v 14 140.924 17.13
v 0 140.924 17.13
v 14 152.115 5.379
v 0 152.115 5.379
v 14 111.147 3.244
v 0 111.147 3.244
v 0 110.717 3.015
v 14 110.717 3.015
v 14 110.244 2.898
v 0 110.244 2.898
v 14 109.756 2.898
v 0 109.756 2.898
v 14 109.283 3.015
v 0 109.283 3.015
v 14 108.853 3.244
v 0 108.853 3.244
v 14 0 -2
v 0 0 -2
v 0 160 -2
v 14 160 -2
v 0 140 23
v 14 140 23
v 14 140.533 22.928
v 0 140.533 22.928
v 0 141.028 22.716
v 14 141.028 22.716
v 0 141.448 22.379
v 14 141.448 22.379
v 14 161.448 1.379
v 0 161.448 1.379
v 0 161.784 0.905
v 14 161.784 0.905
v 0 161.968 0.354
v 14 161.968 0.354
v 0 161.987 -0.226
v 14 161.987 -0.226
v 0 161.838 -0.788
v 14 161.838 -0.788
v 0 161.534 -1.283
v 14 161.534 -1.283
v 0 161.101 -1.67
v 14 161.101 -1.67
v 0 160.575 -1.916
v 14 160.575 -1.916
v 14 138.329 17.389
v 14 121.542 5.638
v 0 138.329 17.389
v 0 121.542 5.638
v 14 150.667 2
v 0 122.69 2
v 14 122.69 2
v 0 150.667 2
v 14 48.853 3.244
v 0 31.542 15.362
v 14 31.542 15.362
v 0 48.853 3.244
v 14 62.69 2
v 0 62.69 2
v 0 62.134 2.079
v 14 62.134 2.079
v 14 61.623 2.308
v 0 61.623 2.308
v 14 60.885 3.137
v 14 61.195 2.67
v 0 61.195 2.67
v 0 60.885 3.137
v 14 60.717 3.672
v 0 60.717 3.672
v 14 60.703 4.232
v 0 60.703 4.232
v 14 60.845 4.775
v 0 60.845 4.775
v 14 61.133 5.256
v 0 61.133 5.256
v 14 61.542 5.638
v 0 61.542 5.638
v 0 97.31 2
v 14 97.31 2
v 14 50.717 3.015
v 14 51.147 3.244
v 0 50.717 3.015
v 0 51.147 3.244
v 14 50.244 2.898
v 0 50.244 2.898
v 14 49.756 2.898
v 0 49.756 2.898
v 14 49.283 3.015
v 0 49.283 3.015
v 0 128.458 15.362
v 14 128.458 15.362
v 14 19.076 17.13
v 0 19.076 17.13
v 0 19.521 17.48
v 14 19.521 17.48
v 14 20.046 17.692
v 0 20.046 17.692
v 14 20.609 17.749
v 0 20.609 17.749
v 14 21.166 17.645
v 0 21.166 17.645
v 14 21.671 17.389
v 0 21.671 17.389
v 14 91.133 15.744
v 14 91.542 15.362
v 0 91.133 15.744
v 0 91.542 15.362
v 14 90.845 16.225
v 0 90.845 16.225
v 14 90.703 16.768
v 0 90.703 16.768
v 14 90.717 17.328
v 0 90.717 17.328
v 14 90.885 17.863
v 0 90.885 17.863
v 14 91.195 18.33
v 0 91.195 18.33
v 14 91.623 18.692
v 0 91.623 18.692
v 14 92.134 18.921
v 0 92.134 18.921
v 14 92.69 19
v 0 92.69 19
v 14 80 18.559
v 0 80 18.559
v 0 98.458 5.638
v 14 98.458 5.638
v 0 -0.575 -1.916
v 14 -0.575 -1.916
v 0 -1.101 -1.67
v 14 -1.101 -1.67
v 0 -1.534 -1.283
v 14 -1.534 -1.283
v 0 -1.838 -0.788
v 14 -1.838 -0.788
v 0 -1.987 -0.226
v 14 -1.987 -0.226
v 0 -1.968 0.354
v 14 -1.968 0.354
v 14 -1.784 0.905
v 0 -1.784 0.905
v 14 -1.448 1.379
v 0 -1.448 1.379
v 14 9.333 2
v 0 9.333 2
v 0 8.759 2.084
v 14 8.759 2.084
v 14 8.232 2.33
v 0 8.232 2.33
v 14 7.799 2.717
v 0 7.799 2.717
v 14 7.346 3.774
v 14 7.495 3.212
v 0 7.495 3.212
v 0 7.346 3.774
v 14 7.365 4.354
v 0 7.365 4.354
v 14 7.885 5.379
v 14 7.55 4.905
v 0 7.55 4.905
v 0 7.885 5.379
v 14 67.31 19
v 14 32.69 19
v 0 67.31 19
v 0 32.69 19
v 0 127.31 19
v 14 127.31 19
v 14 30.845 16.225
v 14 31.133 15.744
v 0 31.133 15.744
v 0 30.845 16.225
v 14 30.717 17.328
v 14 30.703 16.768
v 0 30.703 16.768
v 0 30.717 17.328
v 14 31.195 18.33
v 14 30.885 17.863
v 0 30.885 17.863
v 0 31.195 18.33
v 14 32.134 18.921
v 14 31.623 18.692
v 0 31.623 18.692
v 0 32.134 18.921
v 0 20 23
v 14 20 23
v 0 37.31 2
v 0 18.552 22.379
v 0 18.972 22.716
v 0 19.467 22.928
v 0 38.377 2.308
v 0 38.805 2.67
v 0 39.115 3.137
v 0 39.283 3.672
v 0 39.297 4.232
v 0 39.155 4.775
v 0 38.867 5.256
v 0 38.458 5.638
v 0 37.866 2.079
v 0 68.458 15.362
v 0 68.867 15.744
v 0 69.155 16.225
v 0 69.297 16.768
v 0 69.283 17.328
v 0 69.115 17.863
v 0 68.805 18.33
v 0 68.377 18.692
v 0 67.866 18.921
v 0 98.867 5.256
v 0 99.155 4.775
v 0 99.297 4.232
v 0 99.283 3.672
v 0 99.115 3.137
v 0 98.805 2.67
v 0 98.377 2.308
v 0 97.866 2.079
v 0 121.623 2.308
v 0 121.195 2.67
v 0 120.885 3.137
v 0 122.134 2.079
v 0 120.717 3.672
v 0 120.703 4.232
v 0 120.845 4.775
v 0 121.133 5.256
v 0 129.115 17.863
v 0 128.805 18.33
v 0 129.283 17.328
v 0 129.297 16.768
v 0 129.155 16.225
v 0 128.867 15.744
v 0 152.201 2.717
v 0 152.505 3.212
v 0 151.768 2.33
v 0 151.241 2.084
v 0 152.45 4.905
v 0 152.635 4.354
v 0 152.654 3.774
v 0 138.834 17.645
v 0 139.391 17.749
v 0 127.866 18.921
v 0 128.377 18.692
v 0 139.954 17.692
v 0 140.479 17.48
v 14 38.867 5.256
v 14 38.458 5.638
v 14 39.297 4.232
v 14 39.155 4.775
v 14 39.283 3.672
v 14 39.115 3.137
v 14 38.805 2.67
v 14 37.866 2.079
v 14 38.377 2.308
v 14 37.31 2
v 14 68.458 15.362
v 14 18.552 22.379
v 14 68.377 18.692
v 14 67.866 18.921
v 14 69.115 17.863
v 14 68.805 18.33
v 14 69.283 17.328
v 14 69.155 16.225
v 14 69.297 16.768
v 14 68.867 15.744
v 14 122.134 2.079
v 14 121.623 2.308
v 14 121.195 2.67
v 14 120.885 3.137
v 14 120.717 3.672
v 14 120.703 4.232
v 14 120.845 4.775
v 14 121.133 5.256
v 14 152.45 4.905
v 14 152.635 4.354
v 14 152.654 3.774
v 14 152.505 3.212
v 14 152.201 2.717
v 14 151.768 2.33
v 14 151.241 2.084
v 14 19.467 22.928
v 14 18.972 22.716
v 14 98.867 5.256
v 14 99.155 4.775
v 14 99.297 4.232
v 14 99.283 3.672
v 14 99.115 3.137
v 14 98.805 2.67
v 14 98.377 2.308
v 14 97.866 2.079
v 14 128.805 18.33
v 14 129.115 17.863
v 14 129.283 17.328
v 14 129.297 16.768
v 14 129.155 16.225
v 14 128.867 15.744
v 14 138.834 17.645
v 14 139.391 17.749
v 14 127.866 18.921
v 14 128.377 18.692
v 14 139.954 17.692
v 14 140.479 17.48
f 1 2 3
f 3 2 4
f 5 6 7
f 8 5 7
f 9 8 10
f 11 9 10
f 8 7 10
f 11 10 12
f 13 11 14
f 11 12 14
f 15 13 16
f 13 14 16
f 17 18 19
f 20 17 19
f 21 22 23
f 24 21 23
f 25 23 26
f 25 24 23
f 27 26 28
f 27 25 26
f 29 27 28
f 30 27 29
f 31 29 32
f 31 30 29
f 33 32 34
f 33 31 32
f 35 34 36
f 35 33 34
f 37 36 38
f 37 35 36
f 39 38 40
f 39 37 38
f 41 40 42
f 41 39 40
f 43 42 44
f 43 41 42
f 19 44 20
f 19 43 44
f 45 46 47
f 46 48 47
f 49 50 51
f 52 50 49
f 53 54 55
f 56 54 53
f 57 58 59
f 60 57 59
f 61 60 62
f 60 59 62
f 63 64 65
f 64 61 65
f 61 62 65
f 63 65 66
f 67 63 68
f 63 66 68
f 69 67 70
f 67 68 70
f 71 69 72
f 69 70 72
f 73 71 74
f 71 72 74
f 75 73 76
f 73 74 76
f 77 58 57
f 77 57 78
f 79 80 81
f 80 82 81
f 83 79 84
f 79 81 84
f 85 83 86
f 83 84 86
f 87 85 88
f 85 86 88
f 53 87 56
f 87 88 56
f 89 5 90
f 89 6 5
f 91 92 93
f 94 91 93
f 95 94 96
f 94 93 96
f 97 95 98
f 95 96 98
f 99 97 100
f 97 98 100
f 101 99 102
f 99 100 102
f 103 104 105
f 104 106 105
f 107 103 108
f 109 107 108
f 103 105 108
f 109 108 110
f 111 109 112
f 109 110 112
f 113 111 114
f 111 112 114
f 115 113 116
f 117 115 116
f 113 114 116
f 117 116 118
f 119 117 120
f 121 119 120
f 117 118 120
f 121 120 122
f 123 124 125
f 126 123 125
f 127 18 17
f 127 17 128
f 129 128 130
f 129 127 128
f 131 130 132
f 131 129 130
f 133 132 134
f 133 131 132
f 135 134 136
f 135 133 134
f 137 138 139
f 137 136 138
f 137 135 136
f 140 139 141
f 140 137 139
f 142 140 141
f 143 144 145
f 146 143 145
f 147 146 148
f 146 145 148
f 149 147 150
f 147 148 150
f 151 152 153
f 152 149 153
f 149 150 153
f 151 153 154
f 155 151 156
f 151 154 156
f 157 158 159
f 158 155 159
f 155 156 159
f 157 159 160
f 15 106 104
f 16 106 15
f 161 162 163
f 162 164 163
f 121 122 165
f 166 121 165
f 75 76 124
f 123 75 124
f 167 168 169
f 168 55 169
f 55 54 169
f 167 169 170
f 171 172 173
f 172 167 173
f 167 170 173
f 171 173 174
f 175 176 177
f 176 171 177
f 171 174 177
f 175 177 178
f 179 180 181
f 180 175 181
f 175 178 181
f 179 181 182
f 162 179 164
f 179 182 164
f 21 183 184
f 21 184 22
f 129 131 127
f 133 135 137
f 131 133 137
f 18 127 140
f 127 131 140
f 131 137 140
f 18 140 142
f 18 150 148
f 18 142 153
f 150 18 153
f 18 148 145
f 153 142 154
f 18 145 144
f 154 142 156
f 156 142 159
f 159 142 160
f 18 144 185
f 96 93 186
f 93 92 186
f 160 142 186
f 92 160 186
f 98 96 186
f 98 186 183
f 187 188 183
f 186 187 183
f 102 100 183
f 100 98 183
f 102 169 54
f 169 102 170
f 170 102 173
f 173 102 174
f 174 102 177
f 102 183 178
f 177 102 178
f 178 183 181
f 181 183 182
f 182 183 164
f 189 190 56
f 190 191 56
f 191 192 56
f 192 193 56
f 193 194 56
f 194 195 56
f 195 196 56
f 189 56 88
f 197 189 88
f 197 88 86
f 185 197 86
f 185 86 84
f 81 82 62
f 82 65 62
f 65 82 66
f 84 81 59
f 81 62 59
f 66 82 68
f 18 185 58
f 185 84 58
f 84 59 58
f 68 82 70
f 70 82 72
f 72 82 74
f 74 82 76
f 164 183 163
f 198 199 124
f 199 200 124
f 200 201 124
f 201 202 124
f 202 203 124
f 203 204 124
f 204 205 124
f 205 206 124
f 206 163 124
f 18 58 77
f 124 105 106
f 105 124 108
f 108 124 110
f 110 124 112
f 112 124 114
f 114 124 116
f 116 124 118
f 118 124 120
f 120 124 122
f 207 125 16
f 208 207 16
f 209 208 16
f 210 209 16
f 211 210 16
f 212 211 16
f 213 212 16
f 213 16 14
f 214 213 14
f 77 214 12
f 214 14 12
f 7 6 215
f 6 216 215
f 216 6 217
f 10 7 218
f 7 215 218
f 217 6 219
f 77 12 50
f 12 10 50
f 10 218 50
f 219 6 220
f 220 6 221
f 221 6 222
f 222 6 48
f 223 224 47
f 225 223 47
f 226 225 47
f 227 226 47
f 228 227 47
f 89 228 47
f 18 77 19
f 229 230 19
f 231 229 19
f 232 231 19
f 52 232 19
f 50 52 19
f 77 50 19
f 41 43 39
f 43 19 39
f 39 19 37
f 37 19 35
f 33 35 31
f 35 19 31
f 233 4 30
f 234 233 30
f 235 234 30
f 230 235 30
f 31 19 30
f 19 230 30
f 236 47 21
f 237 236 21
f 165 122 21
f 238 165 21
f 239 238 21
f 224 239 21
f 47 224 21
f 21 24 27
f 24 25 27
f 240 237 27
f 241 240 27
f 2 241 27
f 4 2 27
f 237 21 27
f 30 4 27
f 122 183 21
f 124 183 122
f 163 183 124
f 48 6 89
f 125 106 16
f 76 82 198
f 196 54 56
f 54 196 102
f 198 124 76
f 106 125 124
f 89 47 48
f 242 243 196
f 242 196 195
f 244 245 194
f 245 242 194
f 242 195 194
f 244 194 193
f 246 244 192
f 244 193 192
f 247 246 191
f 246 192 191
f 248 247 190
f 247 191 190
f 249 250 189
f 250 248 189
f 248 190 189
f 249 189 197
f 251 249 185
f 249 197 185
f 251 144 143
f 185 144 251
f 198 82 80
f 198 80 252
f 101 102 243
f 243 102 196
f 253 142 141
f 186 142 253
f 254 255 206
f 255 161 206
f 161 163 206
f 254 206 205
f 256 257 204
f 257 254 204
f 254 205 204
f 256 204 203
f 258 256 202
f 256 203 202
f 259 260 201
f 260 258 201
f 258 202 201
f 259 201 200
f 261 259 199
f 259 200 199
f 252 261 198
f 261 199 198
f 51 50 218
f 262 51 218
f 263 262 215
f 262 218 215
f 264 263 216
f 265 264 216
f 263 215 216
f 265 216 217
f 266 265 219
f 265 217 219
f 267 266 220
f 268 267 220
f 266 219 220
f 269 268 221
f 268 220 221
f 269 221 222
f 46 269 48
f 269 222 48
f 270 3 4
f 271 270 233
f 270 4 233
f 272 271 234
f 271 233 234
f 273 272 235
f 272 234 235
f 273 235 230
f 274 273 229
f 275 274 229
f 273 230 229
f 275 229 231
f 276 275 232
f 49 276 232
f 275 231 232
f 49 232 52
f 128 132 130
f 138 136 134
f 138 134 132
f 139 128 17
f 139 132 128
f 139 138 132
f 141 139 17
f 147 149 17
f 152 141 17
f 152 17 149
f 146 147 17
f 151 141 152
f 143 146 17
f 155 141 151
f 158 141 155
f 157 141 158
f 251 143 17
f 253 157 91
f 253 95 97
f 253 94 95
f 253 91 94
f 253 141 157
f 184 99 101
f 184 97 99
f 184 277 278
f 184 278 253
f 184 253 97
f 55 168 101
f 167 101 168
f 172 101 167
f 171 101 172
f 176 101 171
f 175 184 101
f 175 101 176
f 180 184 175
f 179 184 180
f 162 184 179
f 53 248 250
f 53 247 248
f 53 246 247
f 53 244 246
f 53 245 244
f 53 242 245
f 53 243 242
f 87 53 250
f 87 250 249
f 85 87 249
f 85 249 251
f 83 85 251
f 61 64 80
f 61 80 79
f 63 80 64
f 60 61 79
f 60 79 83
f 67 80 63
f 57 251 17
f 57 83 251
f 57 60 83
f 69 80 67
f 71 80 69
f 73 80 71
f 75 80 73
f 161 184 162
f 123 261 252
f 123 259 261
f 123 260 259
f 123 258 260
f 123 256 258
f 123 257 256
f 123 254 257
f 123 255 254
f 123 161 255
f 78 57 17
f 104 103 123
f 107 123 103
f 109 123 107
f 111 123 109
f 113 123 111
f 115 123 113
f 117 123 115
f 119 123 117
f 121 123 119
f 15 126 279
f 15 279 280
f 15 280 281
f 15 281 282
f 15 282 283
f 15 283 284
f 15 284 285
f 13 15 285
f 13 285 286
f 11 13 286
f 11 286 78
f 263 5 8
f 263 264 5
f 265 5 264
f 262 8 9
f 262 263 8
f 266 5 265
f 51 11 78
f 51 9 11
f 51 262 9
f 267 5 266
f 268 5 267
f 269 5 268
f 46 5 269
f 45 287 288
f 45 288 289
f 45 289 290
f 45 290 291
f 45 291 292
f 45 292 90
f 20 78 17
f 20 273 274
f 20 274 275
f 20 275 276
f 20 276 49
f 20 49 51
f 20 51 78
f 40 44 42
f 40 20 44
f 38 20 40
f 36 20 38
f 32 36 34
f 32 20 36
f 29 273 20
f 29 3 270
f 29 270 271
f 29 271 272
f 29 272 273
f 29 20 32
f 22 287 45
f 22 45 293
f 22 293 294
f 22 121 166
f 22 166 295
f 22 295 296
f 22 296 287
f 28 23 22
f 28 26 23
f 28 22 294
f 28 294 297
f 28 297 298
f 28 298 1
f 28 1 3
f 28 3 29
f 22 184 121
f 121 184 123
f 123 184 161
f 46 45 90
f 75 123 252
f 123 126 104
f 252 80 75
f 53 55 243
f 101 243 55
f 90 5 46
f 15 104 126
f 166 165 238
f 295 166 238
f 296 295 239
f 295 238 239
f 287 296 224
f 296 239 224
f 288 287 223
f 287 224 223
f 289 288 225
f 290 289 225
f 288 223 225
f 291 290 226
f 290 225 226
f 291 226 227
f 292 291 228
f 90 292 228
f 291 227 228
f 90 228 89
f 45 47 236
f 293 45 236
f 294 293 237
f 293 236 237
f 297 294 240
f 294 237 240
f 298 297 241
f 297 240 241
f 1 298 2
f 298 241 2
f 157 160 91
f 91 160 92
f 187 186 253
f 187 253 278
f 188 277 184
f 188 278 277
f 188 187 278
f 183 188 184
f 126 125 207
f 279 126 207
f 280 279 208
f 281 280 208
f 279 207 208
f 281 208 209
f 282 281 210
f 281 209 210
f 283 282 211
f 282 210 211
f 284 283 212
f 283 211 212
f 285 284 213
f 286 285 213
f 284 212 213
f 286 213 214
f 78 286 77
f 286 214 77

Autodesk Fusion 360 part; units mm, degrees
sketch "Sketch1" plane through (0, 0, 0) normal (1, 0, 0) x (0, 1, 0)
  line L0 (0, 0) -> (50, 0) construction
  line L1 (0, 0) -> (0, 21) construction
  line L2 (0, 21) -> (20, 21) construction
  line L3 (0, 0) -> (20, 21) construction
  line L4 (20, 21) -> (50, 0) construction
  line L5 (50, 0) -> (80, 0) construction
  line L6 (20, 21) -> (80, 21) construction
  line L7 (50, 0) -> (80, 21) construction
  line L8 (80, 0) -> (80, 21) construction
  line L9 (7.8851, 5.3793) -> (19.0759, 17.1297)
  line L10 (62.6895, 2) -> (80, 2)
  line L11 (9.3333, 2) -> (37.3105, 2)
  line L12 (31.5425, 15.3615) -> (48.8531, 3.2442)
  line L13 (21.6711, 17.3889) -> (38.4575, 5.6385)
  line L14 (61.5425, 5.6385) -> (80, 18.5587)
  line L15 (0, -2) -> (50, -2)
  line L16 (50, -2) -> (80, -2)
  line L17 (20, 23) -> (80, 23)
  line L18 (-1.4483, 1.3793) -> (18.5517, 22.3793)
  line L19 (32.6895, 19) -> (67.3105, 19)
  line L20 (51.1469, 3.2442) -> (68.4575, 15.3615)
  arc A0 (20, 23) -> (18.5517, 22.3793) centre (20, 21) ccw
  arc A1 (-1.4483, 1.3793) -> (0, -2) centre (0, 0) ccw
  arc A2 (21.6711, 17.3889) -> (19.0759, 17.1297) centre (20.5242, 15.7504) ccw
  arc A3 (7.8851, 5.3793) -> (9.3333, 2) centre (9.3333, 4) ccw
  arc A4 (37.3105, 2) -> (38.4575, 5.6385) centre (37.3105, 4) ccw
  arc A5 (32.6895, 19) -> (31.5425, 15.3615) centre (32.6895, 17) ccw
  arc A6 (68.4575, 15.3615) -> (67.3105, 19) centre (67.3105, 17) ccw
  arc A7 (48.8531, 3.2442) -> (51.1469, 3.2442) centre (50, 4.8826) ccw
  arc A8 (61.5425, 5.6385) -> (62.6895, 2) centre (62.6895, 4) ccw
  line L21 (80, 18.5587) -> (80, 23)
  line L22 (80, 2) -> (80, -2)
  dimension "d52" = 50
  dimension "d53" = 21
  dimension "d54" = 20
  dimension "d55" = 30
  dimension "d56" = 60
  dimension "d61" = 25
  dimension "d62" = 4
  dimension "d63" = 2
  dimension "d64" = 2
  dimension "d65" = 4
  dimension "d66" = 4
  dimension "d67" = 2
  dimension "d68" = 4
  dimension "d69" = 2
  dimension "d70" = 4
  dimension "d71" = 2
  dimension "d73" = 4
  dimension "d74" = 2
  dimension "d75" = 2
  dimension "d76" = 2
  dimension "d77" = 2
  dimension "d78" = 2
  dimension "d79" = 2
  dimension "d80" = 2
  dimension "d81" = 2
  dimension "d82" = 2
extrude "Extrude2" add sketch "Sketch1" along normal blind 14 makes body 1
ref_plane "WorkPlane1" through (0, 80, 0) normal (0, 1, 0) x (0, 0, 1)
mirror "Mirror1" about plane through (0, 80, 0) normal (0, 1, 0) of bodies 1 merged
copy_body "Body->Comp3" bodies 1 removing the originals makes body 2 in component "Truss Half"
component "Truss Half" placed x (1, 0, 0) y (0, 1, 0) z (0, 0, 1) at (0, 0, 0)
